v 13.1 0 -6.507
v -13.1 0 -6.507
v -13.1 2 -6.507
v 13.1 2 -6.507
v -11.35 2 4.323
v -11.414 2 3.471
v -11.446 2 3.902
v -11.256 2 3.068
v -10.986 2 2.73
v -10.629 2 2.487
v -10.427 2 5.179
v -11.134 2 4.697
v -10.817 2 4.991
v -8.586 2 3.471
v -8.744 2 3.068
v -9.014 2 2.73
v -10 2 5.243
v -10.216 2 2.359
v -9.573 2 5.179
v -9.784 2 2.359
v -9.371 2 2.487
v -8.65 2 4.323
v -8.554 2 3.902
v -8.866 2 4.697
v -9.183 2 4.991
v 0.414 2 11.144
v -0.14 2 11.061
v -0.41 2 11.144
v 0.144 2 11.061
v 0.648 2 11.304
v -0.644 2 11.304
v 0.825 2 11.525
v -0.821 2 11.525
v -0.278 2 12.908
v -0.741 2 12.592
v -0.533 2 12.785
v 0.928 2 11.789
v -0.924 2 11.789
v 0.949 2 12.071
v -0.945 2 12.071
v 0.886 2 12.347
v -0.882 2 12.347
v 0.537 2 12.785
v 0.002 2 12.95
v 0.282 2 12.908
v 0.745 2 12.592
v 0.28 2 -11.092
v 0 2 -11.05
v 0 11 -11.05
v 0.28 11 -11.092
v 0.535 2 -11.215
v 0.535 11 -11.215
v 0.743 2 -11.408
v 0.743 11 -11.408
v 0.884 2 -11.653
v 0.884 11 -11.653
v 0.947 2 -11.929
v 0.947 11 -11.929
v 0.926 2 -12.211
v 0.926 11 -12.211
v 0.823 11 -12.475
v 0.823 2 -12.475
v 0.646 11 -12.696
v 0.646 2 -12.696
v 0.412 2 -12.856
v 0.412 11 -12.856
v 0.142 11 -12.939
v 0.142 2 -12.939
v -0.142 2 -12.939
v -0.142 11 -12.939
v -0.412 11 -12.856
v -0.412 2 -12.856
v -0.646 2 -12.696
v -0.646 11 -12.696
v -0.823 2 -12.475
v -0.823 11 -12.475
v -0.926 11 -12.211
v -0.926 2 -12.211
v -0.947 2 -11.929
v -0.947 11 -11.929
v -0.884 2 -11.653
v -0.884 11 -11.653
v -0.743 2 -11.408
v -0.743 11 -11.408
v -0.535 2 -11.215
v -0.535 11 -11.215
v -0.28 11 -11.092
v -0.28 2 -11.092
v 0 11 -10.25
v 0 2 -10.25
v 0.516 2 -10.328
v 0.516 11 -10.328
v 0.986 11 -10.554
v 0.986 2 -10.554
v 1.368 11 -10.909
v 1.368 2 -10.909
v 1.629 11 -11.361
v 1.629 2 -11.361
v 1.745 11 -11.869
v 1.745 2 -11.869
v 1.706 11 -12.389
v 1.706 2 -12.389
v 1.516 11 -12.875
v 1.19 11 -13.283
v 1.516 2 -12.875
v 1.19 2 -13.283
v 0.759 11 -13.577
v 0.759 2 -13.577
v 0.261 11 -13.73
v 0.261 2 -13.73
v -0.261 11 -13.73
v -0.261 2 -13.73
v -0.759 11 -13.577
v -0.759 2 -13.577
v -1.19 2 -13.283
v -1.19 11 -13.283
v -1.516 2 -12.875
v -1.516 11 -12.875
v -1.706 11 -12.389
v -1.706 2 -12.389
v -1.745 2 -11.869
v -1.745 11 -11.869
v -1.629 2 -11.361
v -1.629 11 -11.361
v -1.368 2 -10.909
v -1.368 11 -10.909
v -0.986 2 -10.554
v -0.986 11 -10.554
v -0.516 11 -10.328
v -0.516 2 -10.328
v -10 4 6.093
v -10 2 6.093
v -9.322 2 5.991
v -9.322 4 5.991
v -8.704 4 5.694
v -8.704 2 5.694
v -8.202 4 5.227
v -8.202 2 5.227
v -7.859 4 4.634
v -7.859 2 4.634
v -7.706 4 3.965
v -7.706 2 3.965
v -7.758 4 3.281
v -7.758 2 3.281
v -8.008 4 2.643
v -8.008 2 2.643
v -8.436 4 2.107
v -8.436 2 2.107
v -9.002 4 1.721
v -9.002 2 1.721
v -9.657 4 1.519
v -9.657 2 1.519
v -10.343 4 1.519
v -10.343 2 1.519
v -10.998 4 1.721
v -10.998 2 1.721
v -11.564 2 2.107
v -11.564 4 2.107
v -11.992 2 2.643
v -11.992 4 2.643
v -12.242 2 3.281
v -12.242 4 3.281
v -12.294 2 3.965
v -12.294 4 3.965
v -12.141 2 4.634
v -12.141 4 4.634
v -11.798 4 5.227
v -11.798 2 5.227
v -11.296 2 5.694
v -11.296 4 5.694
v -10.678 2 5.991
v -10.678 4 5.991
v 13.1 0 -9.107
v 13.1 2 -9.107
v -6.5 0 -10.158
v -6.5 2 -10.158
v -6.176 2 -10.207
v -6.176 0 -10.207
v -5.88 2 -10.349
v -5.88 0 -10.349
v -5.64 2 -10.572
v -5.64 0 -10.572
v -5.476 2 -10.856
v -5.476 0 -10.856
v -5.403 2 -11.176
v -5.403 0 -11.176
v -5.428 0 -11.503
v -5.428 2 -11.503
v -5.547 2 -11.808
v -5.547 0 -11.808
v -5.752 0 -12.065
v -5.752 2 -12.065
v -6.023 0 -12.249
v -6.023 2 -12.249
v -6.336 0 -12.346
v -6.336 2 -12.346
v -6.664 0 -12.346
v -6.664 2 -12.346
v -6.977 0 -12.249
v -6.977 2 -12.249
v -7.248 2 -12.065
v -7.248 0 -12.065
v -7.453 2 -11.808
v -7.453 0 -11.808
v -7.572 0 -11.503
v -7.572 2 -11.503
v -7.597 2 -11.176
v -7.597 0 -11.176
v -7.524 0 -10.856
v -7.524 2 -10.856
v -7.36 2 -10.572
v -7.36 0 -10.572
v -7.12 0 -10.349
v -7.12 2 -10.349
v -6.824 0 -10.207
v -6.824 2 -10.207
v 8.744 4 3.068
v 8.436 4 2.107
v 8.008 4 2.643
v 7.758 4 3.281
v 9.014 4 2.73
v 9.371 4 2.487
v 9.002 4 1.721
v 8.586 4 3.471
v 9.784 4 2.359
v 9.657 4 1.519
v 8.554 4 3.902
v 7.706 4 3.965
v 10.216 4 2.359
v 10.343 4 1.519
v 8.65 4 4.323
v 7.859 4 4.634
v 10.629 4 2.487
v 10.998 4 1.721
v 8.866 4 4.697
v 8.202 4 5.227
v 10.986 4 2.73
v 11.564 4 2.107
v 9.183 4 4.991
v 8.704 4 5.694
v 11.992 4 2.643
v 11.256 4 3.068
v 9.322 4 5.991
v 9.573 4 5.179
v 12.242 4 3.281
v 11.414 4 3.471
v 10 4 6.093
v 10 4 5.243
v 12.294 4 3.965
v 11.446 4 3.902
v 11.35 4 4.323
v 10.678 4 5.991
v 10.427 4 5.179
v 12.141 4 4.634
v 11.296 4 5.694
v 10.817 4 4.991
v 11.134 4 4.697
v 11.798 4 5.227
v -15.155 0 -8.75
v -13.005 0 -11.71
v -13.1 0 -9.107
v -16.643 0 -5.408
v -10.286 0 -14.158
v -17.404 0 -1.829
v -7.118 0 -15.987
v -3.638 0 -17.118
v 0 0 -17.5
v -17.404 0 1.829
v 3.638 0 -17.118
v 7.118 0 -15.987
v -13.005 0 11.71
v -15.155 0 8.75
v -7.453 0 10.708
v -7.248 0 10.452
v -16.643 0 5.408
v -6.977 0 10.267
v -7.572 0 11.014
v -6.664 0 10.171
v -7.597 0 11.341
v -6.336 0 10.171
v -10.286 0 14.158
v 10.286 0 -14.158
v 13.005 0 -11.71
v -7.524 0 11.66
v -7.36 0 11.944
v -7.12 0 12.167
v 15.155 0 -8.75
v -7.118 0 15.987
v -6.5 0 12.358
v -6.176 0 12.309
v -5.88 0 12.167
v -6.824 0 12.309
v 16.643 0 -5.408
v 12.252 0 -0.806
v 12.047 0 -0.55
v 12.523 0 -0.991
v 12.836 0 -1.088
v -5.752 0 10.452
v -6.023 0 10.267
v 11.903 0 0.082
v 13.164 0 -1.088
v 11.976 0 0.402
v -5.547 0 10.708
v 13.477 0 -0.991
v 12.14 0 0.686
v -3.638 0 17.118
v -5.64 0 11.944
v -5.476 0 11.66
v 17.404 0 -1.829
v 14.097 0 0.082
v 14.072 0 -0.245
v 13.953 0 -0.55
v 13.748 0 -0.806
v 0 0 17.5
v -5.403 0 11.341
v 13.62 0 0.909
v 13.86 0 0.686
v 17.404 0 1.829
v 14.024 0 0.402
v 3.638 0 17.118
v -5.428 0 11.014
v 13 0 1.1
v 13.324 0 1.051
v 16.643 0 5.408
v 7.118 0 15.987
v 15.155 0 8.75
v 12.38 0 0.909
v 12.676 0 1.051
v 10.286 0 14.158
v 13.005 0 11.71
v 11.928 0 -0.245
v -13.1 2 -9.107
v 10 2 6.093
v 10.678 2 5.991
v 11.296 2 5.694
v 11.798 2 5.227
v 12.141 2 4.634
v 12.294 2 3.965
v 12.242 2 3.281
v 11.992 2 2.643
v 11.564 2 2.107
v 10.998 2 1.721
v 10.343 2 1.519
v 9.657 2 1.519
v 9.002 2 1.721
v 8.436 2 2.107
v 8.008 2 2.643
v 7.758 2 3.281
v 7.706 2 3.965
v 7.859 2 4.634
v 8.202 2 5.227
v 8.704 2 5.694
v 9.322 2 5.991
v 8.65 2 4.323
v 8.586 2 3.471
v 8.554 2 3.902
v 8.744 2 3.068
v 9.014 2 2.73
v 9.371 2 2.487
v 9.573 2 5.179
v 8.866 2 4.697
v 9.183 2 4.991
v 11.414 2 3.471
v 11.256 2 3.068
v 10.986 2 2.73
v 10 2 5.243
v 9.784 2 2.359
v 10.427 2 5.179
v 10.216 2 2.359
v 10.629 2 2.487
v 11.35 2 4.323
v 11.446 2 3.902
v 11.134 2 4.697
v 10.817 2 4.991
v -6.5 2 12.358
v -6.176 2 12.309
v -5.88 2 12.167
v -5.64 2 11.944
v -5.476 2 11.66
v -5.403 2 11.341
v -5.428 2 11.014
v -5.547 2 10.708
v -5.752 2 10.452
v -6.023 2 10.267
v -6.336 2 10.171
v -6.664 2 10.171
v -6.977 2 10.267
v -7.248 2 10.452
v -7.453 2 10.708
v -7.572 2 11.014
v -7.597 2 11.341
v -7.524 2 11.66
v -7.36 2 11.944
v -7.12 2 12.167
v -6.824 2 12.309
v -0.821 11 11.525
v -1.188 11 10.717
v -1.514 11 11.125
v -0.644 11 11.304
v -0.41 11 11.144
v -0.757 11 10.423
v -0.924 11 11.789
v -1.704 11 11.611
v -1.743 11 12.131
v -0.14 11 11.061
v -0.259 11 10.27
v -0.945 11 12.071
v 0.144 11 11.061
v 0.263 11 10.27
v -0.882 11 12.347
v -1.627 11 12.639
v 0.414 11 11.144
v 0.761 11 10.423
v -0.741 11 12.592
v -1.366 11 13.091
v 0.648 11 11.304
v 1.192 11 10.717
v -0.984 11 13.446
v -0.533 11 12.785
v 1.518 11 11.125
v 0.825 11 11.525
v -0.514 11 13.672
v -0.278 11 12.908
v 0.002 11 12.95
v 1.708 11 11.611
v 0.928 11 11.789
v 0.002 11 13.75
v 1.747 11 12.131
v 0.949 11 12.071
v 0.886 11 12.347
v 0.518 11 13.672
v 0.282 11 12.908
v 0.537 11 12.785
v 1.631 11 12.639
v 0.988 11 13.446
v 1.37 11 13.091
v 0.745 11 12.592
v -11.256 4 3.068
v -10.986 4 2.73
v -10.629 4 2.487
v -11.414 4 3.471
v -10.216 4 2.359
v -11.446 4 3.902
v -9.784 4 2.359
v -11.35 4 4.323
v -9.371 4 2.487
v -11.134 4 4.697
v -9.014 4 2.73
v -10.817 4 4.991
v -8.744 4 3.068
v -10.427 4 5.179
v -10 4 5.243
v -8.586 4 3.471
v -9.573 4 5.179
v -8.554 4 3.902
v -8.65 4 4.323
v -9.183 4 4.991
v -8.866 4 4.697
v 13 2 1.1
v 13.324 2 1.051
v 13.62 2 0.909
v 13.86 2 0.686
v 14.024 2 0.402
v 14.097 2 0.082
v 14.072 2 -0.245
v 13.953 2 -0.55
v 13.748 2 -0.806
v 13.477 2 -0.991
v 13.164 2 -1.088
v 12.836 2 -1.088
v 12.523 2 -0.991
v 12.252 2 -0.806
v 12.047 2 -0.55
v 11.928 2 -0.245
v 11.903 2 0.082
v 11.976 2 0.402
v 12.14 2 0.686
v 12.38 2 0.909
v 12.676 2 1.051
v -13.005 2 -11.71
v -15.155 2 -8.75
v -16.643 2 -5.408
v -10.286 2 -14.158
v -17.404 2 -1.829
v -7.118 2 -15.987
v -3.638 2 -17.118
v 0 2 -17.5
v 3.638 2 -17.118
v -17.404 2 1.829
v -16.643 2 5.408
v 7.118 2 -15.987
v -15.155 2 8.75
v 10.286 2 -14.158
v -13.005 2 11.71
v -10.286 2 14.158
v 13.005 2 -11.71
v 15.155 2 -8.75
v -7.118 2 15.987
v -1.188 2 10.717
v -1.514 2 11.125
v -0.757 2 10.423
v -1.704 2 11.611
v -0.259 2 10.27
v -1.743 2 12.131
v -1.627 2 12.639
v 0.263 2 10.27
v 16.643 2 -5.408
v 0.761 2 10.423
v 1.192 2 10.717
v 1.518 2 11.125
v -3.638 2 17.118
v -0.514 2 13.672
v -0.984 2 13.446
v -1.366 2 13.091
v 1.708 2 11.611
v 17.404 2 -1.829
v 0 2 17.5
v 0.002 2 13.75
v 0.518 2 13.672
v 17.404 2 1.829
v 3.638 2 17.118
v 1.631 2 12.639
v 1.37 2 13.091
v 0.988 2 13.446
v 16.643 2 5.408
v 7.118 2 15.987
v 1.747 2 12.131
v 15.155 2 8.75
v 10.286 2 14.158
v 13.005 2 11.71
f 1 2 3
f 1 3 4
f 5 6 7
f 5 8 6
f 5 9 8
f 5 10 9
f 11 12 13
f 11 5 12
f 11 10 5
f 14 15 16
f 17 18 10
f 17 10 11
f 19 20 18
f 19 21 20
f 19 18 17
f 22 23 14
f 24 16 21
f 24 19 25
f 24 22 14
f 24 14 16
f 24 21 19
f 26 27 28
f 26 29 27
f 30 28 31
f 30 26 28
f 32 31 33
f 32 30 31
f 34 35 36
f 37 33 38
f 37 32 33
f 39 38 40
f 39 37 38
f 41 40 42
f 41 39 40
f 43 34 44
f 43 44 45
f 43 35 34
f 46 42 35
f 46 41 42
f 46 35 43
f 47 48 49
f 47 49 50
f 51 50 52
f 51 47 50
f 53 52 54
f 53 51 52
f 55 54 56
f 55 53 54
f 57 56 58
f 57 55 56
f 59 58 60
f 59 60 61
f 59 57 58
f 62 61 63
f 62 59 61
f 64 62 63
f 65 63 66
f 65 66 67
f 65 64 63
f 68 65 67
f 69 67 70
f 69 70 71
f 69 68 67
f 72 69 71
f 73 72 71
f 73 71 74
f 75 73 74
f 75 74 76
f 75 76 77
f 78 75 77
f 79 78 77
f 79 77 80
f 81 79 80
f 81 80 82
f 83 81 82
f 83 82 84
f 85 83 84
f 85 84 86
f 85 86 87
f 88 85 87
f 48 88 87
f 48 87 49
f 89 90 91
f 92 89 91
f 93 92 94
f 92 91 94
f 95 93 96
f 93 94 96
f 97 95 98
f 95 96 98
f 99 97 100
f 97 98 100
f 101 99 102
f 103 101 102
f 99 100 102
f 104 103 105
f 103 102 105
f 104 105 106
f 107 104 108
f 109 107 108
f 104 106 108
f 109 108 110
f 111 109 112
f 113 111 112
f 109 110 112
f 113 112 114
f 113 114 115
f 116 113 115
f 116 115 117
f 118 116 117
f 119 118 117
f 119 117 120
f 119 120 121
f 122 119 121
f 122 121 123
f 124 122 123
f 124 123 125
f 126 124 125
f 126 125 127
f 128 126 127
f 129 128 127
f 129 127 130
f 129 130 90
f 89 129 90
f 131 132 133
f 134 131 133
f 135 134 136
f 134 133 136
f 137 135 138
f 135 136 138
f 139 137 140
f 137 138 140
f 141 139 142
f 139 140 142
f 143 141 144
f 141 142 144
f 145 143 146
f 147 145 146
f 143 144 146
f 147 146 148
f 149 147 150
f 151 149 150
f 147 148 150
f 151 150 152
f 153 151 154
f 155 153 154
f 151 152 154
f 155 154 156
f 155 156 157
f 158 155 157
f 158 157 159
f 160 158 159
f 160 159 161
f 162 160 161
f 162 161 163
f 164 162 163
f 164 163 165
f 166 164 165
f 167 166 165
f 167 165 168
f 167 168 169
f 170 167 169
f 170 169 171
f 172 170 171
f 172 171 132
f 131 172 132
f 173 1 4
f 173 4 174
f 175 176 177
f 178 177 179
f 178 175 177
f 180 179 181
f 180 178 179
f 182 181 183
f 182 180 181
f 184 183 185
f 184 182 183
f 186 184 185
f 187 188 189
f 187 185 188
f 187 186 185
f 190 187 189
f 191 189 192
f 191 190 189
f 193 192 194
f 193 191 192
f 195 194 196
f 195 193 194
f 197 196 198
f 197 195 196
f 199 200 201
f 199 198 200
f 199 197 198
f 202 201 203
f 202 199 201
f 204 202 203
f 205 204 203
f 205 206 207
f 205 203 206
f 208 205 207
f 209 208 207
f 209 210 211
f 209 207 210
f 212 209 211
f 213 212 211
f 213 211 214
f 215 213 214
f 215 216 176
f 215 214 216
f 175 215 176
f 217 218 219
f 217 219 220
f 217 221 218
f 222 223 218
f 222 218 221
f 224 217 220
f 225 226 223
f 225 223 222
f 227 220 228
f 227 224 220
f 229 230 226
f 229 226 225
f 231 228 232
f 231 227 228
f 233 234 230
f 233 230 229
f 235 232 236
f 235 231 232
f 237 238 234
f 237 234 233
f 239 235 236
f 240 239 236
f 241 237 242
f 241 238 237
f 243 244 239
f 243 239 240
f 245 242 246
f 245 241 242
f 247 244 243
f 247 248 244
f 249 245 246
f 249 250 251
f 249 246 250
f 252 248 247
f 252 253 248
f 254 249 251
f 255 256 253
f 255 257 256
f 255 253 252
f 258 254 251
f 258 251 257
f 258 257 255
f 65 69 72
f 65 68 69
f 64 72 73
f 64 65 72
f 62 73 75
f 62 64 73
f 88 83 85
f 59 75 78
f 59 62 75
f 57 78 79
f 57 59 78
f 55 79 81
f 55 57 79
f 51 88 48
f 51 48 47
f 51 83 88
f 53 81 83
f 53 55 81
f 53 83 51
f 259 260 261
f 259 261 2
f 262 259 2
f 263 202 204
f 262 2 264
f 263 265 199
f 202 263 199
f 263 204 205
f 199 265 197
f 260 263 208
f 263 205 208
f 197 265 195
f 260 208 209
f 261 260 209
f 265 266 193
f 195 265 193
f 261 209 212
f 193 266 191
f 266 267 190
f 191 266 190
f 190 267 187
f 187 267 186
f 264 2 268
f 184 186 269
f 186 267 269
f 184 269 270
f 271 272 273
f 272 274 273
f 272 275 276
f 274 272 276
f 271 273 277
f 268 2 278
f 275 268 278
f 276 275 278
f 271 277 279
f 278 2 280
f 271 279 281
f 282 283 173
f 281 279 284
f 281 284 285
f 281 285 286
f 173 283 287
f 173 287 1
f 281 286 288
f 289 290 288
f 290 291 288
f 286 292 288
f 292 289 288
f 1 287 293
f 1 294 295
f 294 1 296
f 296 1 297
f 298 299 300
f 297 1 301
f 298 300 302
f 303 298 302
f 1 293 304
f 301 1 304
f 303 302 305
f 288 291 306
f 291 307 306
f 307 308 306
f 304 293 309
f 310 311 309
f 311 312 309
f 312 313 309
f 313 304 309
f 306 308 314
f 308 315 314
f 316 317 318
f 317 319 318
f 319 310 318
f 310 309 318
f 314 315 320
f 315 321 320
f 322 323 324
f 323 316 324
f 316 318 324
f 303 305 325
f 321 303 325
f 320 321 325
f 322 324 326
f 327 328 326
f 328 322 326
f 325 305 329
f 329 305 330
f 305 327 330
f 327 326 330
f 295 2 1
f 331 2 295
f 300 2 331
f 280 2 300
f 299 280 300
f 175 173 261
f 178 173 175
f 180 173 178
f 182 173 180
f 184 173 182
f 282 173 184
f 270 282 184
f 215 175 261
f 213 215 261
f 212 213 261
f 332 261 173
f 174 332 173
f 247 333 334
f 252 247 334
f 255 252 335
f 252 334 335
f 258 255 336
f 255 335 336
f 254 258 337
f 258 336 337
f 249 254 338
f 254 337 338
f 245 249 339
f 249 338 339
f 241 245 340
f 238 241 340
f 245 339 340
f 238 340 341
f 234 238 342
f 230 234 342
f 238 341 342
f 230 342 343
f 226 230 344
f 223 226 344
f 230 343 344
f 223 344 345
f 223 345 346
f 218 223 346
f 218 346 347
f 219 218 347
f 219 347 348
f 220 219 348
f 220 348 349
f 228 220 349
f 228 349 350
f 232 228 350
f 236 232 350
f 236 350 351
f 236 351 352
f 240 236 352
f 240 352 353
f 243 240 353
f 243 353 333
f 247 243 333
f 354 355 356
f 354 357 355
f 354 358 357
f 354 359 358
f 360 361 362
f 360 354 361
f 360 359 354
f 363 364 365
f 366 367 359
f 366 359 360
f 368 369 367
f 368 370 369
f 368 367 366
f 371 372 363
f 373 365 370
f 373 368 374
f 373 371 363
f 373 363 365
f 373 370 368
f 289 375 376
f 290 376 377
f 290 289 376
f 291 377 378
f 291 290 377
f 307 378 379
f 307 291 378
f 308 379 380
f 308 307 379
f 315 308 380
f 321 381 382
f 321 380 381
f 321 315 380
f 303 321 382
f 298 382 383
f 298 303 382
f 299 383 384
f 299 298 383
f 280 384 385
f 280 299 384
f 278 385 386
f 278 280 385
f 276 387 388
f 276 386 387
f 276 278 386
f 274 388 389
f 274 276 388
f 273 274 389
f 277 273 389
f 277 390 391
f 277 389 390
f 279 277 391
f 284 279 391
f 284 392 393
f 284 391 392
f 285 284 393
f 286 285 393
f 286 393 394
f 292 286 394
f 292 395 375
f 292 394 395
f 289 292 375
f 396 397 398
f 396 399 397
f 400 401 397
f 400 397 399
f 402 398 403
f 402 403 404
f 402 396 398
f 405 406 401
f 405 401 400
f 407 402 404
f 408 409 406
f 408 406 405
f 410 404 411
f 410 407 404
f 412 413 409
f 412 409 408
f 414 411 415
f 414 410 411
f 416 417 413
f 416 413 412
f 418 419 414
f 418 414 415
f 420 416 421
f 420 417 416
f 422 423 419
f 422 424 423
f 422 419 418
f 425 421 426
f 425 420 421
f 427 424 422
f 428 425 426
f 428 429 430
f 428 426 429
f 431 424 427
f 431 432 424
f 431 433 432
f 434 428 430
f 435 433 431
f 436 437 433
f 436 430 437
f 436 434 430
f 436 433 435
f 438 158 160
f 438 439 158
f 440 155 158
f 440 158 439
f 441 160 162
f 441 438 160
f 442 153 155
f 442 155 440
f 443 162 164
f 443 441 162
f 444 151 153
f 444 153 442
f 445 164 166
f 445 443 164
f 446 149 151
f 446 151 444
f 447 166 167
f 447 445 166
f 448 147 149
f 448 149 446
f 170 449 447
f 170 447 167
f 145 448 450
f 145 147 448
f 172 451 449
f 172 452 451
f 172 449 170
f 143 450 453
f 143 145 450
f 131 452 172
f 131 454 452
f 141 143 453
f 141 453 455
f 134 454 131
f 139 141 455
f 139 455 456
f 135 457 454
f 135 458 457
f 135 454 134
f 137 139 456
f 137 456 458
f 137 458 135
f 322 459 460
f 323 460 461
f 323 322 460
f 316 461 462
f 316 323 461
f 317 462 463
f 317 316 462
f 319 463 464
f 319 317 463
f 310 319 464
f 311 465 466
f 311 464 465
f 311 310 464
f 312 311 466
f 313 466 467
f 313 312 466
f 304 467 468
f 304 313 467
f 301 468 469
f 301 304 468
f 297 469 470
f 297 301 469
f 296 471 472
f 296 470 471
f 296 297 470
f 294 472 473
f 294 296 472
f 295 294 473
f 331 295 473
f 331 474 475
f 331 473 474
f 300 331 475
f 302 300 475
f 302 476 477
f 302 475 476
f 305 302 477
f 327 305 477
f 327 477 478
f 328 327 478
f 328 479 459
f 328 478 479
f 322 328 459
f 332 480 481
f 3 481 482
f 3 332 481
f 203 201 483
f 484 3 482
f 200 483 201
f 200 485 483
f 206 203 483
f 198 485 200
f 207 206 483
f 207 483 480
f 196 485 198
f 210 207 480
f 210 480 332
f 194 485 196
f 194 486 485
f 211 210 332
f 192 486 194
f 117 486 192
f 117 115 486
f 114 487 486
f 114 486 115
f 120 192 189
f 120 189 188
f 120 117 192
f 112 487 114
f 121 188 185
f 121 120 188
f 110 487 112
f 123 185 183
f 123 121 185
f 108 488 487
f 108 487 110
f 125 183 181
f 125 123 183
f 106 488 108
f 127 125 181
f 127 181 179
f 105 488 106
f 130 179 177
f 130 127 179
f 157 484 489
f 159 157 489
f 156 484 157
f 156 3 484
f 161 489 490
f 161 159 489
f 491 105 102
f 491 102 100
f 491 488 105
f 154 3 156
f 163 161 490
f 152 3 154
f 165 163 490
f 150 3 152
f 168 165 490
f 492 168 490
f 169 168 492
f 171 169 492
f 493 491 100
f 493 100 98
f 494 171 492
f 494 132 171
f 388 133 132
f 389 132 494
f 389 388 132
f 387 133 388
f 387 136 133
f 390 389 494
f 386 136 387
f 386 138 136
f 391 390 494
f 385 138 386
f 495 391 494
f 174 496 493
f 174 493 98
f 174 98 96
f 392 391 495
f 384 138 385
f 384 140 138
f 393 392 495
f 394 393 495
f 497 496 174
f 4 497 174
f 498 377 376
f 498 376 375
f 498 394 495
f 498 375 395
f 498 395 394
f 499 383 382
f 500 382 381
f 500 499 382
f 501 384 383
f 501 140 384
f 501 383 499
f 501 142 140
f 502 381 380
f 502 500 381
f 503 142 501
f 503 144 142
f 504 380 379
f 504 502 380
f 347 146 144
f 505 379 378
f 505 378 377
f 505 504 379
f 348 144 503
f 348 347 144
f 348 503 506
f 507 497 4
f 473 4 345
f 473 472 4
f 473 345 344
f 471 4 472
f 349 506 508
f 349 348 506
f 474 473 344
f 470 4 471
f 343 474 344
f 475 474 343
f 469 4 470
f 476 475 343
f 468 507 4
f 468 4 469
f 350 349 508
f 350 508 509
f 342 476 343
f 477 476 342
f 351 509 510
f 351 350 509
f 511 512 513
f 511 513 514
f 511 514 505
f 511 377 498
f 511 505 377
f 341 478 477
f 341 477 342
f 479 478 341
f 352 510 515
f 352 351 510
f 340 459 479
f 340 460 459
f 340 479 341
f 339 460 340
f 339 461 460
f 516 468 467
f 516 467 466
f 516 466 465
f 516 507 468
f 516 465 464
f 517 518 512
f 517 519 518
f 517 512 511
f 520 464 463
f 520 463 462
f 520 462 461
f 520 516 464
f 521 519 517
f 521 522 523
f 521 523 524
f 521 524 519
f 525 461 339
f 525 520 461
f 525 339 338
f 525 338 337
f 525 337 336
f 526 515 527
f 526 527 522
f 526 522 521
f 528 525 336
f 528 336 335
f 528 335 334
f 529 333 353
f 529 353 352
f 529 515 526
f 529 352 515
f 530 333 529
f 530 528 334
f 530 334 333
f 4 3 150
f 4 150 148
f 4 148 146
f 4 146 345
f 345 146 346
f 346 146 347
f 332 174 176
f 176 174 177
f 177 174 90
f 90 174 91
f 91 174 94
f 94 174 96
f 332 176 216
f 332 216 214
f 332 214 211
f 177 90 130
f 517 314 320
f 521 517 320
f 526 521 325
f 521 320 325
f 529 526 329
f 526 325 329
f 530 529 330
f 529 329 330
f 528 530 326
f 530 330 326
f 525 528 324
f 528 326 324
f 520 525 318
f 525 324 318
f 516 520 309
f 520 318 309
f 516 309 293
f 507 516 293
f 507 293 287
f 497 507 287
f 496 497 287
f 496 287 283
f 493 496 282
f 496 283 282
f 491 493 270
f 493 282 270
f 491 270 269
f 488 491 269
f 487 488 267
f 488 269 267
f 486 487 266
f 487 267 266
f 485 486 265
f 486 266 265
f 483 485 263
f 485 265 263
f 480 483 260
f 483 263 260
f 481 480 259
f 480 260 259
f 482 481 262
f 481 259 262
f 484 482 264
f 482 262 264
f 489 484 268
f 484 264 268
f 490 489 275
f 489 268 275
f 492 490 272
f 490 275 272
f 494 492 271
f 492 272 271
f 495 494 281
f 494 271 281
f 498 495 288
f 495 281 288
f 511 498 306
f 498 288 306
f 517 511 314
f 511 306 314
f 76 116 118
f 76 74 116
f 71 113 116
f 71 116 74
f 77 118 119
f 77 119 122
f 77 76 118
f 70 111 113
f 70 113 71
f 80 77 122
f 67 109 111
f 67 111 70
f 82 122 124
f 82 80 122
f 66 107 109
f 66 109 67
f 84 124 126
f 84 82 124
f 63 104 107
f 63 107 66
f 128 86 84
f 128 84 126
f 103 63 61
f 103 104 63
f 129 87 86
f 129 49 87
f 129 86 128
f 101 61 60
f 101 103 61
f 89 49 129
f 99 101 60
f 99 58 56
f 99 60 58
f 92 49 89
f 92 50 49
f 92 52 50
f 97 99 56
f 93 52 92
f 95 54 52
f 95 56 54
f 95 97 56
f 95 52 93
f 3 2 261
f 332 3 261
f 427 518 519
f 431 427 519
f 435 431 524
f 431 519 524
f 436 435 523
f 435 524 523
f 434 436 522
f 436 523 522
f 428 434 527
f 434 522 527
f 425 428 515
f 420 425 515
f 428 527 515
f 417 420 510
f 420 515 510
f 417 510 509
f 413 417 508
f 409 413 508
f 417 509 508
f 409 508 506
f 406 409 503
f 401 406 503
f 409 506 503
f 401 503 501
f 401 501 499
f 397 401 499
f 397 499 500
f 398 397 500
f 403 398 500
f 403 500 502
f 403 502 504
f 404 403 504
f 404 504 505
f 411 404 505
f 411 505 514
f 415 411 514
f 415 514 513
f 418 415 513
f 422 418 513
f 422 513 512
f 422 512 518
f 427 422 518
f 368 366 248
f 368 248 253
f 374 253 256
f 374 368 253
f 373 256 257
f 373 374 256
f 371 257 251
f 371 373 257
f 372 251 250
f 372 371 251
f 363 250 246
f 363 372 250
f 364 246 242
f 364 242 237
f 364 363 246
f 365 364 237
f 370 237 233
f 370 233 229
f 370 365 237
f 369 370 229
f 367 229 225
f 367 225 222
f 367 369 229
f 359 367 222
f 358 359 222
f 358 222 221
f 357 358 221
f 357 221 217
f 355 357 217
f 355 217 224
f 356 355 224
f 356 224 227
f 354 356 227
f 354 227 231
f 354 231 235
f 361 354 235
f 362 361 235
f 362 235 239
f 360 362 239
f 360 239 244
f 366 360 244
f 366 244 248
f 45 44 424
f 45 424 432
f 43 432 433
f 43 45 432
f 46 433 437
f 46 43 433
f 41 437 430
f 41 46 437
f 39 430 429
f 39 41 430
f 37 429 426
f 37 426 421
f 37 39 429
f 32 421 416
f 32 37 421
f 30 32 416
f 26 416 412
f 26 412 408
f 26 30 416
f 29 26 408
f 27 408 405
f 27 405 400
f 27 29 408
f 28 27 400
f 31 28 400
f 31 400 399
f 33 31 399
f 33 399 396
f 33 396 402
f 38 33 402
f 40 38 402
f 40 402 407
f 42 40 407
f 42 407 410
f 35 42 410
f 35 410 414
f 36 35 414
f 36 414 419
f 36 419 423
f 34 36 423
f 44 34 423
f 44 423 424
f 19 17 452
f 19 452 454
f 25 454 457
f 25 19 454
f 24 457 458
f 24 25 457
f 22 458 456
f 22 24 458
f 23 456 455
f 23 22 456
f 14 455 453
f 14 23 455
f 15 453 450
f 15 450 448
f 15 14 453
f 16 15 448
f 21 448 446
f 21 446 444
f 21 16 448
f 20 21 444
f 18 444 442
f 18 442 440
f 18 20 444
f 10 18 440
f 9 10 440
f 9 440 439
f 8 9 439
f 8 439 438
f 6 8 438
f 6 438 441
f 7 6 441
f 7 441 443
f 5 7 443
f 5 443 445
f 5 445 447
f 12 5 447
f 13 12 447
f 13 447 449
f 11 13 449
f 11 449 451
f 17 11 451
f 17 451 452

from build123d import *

# Parameters (mm, degrees)
SKETCH_1_R          = 17.5
EXTRUDE_1_DEPTH     = 2
CUT_EXTRUDE_2_REACH = 26.829
SKETCH_1_4_W        = 26.2
SKETCH_1_4_H        = 2.6
SKETCH_1_4_R        = 1.1
SKETCH_1_5_R        = 2.3
SKETCH_1_5_R_2      = 1.45
EXTRUDE_2_DEPTH     = 4
SKETCH_1_6_R        = 1.75
SKETCH_1_6_R_2      = 0.95
EXTRUDE_3_DEPTH     = 11


with BuildPart() as part:
    # 草图1 → 凸台-拉伸1 (new body)
    with BuildSketch(Plane(origin=(0, 0, 0), x_dir=(1, 0, 0), z_dir=(0, 1, 0))):
        with Locations(Location((-4.53e-07, -7.66e-07, 0), (0, 0, 270))):
            Circle(SKETCH_1_R)
    extrude(amount=EXTRUDE_1_DEPTH)

    # 草图1<4> → 切除-拉伸2 (cut, up to next)
    with BuildSketch(Plane(origin=(0, 0, 0), x_dir=(1, 0, 0), z_dir=(0, 1, 0)), mode=Mode.PRIVATE) as cut_extrude_2_sk1:
        with Locations((-4.53e-07, 7.806744123)):
            Rectangle(SKETCH_1_4_W, SKETCH_1_4_H)
    cut_extrude_2_tool1 = extrude(cut_extrude_2_sk1.sketch, amount=CUT_EXTRUDE_2_REACH, mode=Mode.PRIVATE) & part.part
    # 草图1<4> → 切除-拉伸2 (cut, up to next)
    with BuildSketch(Plane(origin=(0, 0, 0), x_dir=(1, 0, 0), z_dir=(0, 1, 0)), mode=Mode.PRIVATE) as cut_extrude_2_sk2:
        with Locations(Location((-6.499999337, -11.258330632, 0), (0, 0, 270))):
            Circle(SKETCH_1_4_R)
    cut_extrude_2_tool2 = extrude(cut_extrude_2_sk2.sketch, amount=CUT_EXTRUDE_2_REACH, mode=Mode.PRIVATE) & part.part
    # 草图1<4> → 切除-拉伸2 (cut, up to next)
    with BuildSketch(Plane(origin=(0, 0, 0), x_dir=(1, 0, 0), z_dir=(0, 1, 0)), mode=Mode.PRIVATE) as cut_extrude_2_sk3:
        with Locations(Location((13, 7.66e-07, 0), (0, 0, 270))):
            Circle(SKETCH_1_4_R)
    cut_extrude_2_tool3 = extrude(cut_extrude_2_sk3.sketch, amount=CUT_EXTRUDE_2_REACH, mode=Mode.PRIVATE) & part.part
    # 草图1<4> → 切除-拉伸2 (cut, up to next)
    with BuildSketch(Plane(origin=(0, 0, 0), x_dir=(1, 0, 0), z_dir=(0, 1, 0)), mode=Mode.PRIVATE) as cut_extrude_2_sk4:
        with Locations(Location((-6.500000663, 11.258329866, 0), (0, 0, 270))):
            Circle(SKETCH_1_4_R)
    cut_extrude_2_tool4 = extrude(cut_extrude_2_sk4.sketch, amount=CUT_EXTRUDE_2_REACH, mode=Mode.PRIVATE) & part.part
    add(cut_extrude_2_tool1.solids().sort_by_distance((0, 0, -7.806744))[0], mode=Mode.SUBTRACT)
    add(cut_extrude_2_tool2.solids().sort_by_distance((-6.499999, 0, 11.258331))[0], mode=Mode.SUBTRACT)
    add(cut_extrude_2_tool3.solids().sort_by_distance((13, 0, -1e-06))[0], mode=Mode.SUBTRACT)
    add(cut_extrude_2_tool4.solids().sort_by_distance((-6.500001, 0, -11.25833))[0], mode=Mode.SUBTRACT)

    # 草图1<5> → 凸台-拉伸2 (add)
    # profile 1 of 2: a face of its own
    with BuildSketch(Plane(origin=(0, 0, 0), x_dir=(1, 0, 0), z_dir=(0, 1, 0))):
        with Locations(Location((-10, -3.793255877, 0), (0, 0, 270))):
            Circle(SKETCH_1_5_R)
        with Locations(Location((-10, -3.793255877, 0), (0, 0, 270))):
            Circle(SKETCH_1_5_R_2, mode=Mode.SUBTRACT)
    # profile 2 of 2: a face of its own
    with BuildSketch(Plane(origin=(0, 0, 0), x_dir=(1, 0, 0), z_dir=(0, 1, 0))):
        with Locations(Location((10, -3.793255877, 0), (0, 0, 270))):
            Circle(SKETCH_1_5_R)
        with Locations(Location((10, -3.793255877, 0), (0, 0, 270))):
            Circle(SKETCH_1_5_R_2, mode=Mode.SUBTRACT)
    extrude(amount=EXTRUDE_2_DEPTH)

    # 草图1<6> → 凸台-拉伸3 (add)
    # profile 1 of 2: a face of its own
    with BuildSketch(Plane(origin=(0, 0, 0), x_dir=(1, 0, 0), z_dir=(0, 1, 0))):
        with Locations(Location((0, 12, 0), (0, 0, 270))):
            Circle(SKETCH_1_6_R)
        with Locations(Location((0, 12, 0), (0, 0, 270))):
            Circle(SKETCH_1_6_R_2, mode=Mode.SUBTRACT)
    # profile 2 of 2: a face of its own
    with BuildSketch(Plane(origin=(0, 0, 0), x_dir=(1, 0, 0), z_dir=(0, 1, 0))):
        with Locations(Location((0.002, -12, 0), (0, 0, 270))):
            Circle(SKETCH_1_6_R)
        with Locations(Location((0.002, -12, 0), (0, 0, 270))):
            Circle(SKETCH_1_6_R_2, mode=Mode.SUBTRACT)
    extrude(amount=EXTRUDE_3_DEPTH)


solid = part.part
